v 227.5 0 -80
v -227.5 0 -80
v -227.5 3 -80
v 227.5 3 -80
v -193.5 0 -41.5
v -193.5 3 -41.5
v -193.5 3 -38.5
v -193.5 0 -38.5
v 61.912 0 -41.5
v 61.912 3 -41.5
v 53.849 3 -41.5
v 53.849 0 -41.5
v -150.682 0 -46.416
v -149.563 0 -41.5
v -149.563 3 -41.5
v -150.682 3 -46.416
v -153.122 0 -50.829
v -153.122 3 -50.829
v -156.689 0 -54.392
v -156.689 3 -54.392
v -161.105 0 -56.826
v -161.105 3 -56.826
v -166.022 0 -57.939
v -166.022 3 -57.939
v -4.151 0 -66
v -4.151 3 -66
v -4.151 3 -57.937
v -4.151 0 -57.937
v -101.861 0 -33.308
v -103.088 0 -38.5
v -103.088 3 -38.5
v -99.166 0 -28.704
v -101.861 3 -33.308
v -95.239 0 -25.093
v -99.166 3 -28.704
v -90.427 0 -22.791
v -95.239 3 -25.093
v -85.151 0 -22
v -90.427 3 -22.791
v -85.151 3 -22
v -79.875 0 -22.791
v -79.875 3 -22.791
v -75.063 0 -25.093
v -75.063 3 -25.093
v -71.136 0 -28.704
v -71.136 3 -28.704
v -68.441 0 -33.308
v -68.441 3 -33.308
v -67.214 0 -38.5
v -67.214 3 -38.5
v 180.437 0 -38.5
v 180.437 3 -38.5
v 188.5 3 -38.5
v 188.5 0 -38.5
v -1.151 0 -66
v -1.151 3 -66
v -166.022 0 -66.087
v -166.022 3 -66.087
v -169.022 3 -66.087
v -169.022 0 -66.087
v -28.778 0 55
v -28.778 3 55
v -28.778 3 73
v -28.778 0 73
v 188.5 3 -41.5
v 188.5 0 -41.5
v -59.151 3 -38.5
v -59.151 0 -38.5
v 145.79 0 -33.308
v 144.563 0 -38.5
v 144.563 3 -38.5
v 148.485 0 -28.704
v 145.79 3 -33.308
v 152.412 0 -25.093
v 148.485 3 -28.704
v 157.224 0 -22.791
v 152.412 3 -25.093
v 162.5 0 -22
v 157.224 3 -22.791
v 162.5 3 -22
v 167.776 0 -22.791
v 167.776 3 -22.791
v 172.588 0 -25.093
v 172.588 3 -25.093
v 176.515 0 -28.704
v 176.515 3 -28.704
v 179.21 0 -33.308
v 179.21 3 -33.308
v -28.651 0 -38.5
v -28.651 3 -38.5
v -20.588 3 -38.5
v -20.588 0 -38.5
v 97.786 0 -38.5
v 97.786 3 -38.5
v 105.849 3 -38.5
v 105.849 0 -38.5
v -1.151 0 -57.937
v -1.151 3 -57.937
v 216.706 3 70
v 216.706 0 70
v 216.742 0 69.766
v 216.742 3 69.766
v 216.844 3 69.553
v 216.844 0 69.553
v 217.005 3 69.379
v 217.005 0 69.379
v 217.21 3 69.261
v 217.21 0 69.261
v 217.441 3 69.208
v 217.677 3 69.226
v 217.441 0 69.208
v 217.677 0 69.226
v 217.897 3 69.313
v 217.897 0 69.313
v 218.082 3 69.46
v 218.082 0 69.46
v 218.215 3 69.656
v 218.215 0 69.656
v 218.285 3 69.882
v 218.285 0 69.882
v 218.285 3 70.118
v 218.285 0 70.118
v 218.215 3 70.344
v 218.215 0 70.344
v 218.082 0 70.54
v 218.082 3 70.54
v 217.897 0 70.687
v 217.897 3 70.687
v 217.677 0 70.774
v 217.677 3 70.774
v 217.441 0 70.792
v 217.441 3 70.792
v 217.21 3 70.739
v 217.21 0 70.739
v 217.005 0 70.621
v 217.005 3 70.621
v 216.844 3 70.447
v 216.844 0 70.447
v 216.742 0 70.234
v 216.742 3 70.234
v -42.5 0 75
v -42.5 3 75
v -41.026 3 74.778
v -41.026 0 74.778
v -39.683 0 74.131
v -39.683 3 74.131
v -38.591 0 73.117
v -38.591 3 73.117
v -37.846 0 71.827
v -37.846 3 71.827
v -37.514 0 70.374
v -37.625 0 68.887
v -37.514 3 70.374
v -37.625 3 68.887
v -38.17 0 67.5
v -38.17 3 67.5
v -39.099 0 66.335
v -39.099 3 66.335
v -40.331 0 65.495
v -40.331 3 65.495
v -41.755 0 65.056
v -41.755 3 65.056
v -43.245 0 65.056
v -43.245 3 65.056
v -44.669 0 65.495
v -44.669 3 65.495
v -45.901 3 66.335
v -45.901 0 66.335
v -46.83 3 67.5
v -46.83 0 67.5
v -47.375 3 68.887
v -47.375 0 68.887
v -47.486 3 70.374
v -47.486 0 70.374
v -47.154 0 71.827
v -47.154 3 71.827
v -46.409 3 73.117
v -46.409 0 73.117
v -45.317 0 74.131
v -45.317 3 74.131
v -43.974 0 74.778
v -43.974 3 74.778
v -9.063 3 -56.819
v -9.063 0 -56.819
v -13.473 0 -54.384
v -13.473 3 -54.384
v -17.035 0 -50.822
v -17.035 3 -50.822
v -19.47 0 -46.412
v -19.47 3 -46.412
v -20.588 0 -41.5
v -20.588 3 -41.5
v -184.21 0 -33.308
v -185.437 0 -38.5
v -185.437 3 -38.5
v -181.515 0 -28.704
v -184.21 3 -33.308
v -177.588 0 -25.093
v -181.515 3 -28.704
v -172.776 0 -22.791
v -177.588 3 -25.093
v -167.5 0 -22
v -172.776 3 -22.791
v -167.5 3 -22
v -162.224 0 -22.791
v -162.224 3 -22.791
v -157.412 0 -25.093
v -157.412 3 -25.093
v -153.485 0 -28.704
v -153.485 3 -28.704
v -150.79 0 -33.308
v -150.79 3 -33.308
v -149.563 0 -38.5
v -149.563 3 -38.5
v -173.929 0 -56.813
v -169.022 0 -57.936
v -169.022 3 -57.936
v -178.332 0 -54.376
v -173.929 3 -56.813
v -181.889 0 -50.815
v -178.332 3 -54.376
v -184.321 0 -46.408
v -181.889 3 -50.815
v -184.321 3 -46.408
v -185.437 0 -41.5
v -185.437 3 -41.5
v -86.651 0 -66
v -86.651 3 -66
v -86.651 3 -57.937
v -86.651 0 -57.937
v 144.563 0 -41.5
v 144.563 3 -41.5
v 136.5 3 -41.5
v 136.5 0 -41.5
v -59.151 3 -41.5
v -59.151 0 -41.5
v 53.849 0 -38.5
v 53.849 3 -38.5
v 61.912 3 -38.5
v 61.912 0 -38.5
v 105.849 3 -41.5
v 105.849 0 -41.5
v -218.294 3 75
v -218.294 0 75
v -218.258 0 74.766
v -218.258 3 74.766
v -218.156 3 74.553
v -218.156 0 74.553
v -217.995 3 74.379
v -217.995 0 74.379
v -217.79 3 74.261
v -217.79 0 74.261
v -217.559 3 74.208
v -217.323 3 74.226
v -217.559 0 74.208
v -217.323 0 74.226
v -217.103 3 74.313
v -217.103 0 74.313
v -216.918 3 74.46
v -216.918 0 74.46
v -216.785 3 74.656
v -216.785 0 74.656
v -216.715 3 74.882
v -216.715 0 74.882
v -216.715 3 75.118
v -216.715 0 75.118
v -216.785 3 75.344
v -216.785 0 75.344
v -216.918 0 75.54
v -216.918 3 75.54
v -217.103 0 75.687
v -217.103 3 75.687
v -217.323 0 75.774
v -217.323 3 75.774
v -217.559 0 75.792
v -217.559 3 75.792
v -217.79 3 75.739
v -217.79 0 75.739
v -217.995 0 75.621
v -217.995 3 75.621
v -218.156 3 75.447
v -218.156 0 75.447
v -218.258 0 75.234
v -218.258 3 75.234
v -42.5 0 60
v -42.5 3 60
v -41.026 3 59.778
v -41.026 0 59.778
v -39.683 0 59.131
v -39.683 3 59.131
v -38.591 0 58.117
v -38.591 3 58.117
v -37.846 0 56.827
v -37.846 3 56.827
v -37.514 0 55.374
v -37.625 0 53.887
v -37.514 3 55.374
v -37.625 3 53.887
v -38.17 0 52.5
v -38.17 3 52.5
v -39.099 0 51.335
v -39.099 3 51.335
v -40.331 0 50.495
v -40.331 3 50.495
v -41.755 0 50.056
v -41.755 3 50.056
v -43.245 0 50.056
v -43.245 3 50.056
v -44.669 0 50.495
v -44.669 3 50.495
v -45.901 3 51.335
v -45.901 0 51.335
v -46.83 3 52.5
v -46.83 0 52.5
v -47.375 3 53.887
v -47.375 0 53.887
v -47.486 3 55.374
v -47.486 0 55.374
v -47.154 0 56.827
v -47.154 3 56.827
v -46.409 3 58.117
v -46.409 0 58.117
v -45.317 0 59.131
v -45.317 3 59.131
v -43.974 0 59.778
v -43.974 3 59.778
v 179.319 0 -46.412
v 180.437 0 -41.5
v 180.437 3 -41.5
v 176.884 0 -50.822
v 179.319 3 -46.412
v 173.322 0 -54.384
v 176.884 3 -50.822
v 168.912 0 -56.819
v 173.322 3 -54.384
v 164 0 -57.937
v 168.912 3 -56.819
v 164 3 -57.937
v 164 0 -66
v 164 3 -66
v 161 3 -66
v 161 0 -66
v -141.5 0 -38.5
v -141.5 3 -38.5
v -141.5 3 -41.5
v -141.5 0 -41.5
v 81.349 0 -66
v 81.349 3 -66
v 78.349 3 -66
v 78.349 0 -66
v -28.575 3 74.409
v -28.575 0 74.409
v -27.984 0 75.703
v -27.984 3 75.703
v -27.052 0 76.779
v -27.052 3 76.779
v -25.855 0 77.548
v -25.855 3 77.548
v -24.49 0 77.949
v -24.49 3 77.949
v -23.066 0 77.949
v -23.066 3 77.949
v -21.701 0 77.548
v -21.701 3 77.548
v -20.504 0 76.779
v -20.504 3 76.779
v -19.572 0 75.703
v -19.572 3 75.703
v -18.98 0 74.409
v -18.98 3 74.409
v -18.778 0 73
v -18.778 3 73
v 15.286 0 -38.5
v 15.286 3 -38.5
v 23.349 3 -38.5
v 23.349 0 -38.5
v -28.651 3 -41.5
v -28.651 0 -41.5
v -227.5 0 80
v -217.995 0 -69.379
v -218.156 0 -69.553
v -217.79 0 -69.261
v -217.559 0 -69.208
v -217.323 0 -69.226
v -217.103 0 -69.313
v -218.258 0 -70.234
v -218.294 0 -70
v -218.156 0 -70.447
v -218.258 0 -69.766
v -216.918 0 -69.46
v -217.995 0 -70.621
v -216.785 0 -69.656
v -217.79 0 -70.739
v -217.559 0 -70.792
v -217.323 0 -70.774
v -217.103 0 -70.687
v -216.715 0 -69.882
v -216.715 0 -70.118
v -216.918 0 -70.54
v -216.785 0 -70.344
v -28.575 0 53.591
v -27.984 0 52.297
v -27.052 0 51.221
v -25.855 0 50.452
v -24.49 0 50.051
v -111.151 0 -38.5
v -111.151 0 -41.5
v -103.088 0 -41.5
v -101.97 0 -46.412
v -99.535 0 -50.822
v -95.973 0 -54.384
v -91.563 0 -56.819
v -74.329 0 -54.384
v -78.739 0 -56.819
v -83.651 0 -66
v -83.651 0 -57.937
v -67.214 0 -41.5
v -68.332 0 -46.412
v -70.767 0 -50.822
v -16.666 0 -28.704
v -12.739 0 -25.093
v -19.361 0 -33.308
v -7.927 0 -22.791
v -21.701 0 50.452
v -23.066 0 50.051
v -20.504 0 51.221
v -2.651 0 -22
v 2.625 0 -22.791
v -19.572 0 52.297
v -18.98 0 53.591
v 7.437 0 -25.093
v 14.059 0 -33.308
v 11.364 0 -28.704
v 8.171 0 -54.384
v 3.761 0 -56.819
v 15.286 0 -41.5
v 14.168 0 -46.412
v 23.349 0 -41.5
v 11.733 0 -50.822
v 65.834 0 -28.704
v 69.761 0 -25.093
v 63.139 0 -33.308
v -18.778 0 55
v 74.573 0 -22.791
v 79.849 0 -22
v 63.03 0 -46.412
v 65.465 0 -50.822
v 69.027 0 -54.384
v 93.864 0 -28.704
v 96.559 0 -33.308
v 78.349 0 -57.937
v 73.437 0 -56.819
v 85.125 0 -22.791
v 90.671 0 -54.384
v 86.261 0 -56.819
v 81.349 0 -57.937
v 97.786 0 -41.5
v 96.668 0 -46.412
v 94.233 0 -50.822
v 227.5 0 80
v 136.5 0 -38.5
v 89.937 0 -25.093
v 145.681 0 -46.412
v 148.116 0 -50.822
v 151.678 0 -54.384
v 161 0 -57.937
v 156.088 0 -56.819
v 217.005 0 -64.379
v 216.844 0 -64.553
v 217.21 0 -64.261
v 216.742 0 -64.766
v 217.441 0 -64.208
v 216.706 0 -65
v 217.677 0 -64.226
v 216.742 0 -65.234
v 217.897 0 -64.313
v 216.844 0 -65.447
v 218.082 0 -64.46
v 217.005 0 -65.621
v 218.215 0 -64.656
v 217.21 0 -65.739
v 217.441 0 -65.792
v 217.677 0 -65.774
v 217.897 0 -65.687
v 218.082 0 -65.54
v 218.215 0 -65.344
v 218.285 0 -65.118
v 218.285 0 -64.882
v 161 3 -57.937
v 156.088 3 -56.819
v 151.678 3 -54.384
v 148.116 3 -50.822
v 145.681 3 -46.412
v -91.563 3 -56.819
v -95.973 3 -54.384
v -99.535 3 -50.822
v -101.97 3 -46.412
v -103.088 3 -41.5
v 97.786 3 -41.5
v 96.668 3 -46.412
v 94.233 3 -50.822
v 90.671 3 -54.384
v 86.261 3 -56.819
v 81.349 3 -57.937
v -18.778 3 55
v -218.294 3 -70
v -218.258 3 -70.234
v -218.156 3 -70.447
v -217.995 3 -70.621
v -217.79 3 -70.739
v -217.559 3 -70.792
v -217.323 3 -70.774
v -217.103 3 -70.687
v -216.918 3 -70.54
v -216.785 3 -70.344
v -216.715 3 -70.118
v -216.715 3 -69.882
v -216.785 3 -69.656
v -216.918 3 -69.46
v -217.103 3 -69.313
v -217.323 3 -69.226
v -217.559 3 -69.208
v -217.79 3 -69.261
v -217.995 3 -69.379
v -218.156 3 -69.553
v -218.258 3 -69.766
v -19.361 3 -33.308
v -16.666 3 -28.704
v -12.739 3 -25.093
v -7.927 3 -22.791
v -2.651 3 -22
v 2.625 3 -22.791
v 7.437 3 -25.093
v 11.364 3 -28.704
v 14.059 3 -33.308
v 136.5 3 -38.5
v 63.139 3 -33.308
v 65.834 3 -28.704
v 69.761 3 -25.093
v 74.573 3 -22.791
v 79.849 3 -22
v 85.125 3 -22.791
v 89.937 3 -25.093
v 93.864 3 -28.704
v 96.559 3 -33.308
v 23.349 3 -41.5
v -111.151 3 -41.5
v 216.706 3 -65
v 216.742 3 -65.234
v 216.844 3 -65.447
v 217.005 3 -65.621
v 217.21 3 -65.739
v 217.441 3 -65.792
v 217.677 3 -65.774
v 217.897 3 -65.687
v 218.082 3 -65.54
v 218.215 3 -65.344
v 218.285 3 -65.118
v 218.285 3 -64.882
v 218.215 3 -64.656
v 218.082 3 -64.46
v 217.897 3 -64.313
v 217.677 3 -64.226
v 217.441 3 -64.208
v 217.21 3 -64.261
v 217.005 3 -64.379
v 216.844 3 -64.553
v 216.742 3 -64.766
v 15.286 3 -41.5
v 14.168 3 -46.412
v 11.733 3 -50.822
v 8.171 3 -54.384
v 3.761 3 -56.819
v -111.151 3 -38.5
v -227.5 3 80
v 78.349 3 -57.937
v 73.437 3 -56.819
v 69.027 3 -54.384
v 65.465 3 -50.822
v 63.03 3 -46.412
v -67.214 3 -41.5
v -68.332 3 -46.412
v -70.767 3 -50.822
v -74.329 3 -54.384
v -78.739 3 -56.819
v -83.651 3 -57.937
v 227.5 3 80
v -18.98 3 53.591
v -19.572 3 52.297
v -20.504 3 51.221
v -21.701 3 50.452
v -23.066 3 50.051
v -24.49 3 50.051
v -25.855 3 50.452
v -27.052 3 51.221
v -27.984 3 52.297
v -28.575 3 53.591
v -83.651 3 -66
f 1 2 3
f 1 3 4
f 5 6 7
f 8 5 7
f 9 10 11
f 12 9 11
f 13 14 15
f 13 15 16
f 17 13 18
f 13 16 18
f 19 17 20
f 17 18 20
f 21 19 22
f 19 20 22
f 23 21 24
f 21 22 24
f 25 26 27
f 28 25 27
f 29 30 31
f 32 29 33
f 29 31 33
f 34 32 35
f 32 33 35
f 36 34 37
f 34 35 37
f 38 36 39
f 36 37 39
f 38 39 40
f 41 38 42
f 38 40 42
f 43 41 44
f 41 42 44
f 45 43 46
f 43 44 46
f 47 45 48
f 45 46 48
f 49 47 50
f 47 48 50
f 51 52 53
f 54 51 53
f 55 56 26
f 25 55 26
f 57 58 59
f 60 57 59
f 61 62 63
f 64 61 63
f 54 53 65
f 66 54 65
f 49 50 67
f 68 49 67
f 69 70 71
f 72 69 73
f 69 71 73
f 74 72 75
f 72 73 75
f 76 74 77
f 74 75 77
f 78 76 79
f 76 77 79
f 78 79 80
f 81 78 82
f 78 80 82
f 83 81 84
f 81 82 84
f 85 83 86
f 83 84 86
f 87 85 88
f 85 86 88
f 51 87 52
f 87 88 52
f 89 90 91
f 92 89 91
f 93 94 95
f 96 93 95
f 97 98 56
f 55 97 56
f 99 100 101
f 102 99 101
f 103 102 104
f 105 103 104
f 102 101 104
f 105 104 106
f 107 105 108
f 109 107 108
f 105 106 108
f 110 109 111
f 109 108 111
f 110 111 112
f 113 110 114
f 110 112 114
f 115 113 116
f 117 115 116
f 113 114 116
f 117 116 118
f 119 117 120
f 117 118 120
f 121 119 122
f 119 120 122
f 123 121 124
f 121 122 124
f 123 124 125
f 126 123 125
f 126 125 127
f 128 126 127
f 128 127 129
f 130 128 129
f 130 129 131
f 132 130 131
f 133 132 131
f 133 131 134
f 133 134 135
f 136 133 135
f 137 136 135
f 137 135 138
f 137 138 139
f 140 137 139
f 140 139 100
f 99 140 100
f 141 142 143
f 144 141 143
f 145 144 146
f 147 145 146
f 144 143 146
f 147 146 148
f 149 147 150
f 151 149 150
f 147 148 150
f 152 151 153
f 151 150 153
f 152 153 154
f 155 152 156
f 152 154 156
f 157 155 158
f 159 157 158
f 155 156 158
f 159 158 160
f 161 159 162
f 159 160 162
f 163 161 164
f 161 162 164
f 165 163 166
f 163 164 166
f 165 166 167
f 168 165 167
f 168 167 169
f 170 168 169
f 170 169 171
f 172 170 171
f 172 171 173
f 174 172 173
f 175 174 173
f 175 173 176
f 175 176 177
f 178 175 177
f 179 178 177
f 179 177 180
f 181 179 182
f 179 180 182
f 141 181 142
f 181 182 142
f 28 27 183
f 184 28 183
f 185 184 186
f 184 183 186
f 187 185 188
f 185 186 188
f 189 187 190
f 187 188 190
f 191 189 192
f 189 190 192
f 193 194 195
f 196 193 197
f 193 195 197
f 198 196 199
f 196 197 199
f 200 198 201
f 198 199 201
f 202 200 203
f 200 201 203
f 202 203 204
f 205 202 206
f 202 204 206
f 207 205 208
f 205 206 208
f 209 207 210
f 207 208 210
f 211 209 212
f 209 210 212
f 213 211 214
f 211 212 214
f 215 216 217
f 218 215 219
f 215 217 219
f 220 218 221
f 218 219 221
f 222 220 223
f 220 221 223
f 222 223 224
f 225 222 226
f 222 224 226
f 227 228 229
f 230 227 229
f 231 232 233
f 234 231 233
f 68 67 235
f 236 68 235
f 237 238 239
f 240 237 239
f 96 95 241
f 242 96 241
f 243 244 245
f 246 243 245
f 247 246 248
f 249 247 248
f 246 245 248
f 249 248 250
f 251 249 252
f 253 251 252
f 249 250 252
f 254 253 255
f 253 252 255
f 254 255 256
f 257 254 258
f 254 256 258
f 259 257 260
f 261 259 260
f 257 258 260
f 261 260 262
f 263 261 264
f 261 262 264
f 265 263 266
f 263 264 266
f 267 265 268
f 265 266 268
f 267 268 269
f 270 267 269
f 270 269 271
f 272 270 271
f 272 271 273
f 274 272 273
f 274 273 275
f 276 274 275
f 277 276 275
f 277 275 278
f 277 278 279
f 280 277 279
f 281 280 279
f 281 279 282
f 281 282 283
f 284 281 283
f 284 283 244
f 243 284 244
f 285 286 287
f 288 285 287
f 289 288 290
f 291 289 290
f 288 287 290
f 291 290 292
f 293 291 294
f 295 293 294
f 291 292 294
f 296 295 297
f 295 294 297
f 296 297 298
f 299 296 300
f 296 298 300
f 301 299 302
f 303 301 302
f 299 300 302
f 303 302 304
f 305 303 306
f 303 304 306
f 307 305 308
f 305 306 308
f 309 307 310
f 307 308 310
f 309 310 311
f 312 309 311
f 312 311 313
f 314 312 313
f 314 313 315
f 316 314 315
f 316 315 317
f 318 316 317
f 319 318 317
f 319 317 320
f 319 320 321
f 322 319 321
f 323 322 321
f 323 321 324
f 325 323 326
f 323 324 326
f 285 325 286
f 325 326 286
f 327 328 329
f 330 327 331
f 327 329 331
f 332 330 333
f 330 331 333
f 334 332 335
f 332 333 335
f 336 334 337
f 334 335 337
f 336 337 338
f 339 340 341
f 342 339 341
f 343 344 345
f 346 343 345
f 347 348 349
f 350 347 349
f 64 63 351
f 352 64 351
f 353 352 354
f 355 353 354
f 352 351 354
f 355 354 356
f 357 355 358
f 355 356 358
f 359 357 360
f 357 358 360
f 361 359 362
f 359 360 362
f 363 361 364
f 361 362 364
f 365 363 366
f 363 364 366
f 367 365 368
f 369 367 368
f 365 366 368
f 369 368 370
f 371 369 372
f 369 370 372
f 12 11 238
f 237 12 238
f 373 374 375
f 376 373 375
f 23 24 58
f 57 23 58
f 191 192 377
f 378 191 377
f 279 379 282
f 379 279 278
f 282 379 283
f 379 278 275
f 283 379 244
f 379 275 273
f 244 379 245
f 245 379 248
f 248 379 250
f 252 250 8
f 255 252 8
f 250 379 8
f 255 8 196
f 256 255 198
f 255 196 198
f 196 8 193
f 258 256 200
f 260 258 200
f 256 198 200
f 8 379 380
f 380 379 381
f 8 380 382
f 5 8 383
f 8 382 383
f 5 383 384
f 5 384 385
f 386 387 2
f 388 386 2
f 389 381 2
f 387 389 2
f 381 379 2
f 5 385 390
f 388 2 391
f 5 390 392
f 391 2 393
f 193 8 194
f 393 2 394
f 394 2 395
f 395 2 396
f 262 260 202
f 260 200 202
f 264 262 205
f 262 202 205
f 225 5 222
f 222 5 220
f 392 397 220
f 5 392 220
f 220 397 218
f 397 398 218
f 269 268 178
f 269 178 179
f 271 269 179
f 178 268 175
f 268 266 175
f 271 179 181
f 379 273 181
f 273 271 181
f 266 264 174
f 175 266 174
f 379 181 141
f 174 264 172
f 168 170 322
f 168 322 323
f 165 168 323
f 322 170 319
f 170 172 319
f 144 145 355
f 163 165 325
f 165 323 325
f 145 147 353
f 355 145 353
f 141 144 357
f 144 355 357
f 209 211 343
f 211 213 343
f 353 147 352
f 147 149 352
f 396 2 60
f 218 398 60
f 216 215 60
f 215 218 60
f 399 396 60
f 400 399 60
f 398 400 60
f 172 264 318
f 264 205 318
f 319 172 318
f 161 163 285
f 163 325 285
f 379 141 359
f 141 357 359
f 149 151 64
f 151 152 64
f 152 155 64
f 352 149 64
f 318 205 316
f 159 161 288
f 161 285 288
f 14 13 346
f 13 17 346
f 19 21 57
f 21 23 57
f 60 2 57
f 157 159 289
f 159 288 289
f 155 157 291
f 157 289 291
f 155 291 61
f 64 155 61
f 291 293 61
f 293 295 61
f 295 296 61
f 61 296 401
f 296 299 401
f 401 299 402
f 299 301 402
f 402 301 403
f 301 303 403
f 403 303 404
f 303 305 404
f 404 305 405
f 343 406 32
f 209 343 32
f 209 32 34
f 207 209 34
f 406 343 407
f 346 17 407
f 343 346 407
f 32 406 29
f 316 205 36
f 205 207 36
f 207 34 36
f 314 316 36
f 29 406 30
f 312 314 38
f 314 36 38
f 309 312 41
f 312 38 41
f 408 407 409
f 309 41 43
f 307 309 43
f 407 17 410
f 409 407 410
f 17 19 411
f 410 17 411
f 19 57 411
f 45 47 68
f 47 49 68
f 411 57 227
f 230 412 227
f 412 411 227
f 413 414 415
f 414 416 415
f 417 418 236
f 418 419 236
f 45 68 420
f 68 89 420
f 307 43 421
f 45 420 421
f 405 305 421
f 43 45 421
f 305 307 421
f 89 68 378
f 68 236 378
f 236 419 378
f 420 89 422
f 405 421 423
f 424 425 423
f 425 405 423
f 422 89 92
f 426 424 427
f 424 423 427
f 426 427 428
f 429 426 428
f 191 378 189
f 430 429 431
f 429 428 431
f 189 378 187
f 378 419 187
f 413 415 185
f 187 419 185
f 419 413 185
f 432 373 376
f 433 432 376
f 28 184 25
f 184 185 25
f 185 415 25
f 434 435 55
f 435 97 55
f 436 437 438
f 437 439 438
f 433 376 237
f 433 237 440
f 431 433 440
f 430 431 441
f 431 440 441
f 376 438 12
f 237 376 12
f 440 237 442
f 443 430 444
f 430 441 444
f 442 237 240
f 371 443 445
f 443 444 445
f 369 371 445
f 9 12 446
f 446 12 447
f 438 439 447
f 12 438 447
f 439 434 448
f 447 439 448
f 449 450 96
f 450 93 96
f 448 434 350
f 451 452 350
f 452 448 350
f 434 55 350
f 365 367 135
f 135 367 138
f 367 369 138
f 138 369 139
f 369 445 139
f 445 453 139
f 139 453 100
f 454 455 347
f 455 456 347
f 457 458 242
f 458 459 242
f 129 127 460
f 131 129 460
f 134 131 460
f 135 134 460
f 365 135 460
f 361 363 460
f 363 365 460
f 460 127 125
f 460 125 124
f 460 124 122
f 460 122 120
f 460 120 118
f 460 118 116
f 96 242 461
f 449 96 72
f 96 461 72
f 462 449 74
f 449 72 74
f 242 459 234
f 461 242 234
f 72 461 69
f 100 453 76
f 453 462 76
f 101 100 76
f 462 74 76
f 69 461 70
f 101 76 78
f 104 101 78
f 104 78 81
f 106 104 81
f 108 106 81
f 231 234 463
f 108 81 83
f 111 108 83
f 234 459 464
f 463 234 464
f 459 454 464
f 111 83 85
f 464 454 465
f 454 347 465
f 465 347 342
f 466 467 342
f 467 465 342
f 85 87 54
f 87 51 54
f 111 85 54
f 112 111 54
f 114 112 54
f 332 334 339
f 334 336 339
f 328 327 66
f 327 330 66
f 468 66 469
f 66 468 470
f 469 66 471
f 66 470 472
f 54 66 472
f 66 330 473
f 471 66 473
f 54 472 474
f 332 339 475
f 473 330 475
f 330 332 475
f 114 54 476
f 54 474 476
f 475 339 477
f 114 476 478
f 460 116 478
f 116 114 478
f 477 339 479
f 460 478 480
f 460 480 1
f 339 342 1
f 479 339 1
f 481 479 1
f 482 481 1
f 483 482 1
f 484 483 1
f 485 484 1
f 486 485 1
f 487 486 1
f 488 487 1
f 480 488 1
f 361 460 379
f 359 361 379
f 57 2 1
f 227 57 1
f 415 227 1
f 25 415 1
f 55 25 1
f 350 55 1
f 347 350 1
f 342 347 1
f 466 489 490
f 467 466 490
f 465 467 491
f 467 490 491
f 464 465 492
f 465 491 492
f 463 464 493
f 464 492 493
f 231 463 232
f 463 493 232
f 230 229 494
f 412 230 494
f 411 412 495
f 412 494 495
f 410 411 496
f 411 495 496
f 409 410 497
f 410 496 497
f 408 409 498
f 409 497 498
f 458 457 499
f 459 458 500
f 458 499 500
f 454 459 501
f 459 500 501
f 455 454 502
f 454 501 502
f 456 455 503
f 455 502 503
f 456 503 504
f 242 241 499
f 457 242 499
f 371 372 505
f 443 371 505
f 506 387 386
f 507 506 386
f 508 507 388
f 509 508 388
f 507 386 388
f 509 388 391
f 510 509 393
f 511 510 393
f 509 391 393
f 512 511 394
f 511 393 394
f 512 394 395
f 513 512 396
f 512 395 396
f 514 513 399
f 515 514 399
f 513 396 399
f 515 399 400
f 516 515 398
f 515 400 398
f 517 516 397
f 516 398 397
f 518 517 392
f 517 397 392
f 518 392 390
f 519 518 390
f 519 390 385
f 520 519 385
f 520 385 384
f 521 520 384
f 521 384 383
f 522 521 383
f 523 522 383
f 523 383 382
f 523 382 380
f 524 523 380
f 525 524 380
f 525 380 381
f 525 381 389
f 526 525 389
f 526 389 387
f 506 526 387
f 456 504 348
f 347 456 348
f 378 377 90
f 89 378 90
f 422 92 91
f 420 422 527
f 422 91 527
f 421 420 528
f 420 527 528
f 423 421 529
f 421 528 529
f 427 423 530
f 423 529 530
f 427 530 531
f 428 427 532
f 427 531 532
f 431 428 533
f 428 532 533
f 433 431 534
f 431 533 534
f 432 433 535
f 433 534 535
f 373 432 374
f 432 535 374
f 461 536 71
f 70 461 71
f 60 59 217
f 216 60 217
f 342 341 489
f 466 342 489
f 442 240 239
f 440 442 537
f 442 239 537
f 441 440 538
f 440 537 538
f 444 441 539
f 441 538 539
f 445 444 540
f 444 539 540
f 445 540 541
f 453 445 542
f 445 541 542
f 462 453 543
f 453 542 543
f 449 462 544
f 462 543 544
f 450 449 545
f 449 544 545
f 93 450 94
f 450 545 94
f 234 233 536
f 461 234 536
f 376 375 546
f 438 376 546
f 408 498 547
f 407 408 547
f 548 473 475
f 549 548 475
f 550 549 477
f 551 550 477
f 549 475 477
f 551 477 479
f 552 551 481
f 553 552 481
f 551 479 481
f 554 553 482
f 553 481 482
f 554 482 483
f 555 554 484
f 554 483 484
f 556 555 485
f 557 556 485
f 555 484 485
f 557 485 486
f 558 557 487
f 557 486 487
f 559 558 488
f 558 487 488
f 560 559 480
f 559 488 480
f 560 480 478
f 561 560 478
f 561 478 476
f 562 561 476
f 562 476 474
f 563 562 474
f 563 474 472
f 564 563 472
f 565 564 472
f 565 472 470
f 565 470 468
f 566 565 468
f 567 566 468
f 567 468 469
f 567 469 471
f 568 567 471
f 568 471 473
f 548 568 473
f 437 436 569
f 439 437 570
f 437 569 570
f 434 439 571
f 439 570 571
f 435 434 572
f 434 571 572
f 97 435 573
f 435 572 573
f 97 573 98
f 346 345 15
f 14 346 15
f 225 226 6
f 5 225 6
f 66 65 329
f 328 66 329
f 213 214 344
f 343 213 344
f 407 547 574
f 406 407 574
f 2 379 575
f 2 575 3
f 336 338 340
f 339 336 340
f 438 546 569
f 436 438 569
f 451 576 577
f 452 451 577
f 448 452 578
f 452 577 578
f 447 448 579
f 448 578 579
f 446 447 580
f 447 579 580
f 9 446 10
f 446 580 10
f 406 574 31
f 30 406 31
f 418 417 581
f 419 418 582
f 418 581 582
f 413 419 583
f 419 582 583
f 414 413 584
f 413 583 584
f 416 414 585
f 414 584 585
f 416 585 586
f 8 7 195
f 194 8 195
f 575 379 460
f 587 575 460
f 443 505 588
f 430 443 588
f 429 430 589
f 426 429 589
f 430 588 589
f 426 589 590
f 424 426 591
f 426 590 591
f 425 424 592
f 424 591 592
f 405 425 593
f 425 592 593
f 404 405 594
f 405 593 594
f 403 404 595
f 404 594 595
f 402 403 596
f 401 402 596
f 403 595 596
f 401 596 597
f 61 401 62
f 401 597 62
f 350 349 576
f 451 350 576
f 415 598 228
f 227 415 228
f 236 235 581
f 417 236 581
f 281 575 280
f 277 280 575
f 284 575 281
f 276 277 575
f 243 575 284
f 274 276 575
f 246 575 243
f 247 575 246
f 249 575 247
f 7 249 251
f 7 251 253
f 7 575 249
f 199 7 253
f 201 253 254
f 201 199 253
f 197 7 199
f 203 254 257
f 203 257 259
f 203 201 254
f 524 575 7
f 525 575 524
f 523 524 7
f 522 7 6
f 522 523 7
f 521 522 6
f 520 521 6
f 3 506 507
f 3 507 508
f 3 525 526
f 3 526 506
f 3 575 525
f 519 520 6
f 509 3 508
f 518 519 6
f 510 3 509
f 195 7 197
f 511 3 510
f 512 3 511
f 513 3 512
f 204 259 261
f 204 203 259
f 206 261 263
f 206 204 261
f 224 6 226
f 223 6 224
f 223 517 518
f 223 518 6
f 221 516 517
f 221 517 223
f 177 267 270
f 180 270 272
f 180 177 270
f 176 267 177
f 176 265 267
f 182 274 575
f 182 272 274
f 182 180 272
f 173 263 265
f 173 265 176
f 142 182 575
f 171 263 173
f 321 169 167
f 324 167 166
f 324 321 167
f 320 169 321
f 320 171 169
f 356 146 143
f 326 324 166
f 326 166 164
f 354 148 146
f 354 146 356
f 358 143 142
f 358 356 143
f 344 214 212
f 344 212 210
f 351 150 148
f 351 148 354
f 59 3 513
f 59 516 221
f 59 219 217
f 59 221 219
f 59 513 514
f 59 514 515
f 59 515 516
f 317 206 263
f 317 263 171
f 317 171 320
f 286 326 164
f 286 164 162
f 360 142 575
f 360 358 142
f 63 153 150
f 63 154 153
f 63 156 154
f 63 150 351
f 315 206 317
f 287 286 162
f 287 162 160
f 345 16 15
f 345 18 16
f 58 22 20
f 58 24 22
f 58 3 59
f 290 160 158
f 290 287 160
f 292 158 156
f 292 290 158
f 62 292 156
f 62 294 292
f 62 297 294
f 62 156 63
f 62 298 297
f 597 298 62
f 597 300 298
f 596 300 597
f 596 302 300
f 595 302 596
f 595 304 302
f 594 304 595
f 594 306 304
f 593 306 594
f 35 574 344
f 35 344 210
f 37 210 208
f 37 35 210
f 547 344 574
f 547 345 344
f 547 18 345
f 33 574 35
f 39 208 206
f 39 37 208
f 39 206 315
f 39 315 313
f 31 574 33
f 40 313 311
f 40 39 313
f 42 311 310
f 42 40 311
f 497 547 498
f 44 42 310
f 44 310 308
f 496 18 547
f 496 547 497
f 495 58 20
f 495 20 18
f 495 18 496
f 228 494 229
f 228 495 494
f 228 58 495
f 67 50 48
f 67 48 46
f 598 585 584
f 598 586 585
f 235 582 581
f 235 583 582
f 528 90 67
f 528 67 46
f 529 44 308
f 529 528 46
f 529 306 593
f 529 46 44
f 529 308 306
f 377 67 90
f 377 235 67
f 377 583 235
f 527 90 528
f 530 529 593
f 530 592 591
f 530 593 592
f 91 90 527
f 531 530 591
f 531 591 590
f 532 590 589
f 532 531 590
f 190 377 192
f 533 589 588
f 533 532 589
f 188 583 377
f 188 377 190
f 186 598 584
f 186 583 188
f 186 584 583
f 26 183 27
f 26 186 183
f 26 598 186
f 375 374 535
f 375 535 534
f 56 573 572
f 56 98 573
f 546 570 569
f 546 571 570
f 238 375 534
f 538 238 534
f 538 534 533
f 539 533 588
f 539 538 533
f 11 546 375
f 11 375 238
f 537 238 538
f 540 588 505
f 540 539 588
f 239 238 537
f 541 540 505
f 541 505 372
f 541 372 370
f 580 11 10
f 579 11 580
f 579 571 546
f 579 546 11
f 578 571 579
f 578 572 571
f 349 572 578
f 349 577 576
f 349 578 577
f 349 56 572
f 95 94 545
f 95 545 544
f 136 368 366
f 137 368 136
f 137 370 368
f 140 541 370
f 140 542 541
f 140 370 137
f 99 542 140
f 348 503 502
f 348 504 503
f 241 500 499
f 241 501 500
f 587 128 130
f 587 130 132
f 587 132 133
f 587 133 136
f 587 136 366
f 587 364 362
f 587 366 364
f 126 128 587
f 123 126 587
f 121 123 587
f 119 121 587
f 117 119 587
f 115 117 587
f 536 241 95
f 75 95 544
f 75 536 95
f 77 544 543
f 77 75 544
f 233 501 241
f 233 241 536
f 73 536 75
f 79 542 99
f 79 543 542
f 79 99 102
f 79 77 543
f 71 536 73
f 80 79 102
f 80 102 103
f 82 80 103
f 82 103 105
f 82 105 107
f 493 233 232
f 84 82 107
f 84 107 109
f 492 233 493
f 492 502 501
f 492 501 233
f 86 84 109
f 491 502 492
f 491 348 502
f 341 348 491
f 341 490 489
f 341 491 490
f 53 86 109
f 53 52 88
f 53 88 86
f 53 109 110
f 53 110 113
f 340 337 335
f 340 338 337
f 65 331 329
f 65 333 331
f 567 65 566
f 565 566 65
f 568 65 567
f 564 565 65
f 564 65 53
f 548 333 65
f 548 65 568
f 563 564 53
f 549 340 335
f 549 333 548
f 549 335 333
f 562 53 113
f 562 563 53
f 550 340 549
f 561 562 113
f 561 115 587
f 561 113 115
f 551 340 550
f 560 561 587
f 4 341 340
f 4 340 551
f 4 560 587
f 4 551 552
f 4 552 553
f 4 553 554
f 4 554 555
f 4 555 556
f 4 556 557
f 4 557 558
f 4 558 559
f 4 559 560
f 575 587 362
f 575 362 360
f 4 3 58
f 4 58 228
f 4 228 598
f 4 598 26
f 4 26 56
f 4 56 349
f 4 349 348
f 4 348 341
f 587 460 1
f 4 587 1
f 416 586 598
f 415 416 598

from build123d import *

# Parameters (mm, degrees)
SKETCH1_W                      = 455
SKETCH1_H                      = 160
BOSS_EXTRUDE1_DEPTH            = 3
SKETCH2_R                      = 18
SKETCH2_R_2                    = 5
CUT_EXTRUDE1_DEPTH             = 3
F_1_16_0_0625_DIAMETER_HOLE2_D = 1.5875
CUT_EXTRUDE2_DEPTH             = 10
SKETCH7_4_W                    = 3
SKETCH7_4_H                    = 26
CUT_EXTRUDE3_DEPTH             = 10


with BuildPart() as part:
    # Sketch1 → Boss-Extrude1 (new body)
    with BuildSketch(Plane(origin=(0, 0, 0), x_dir=(1, 0, 0), z_dir=(0, 1, 0))):
        Rectangle(SKETCH1_W, SKETCH1_H)
    extrude(amount=BOSS_EXTRUDE1_DEPTH)

    # Sketch2 → Cut-Extrude1 (cut)
    with BuildSketch(Plane(origin=(0, 3, 0), x_dir=(1, 0, 0), z_dir=(0, 1, 0))):
        with Locations((-167.5, 40)):
            Circle(SKETCH2_R)
        with Locations((-85.151099534, 40)):
            Circle(SKETCH2_R)
        with Locations((-2.651099534, 40)):
            Circle(SKETCH2_R)
        with Locations((79.848900466, 39.999983289)):
            Circle(SKETCH2_R)
        with Locations((162.5, 40)):
            Circle(SKETCH2_R)
        with Locations((-42.5, -55)):
            Circle(SKETCH2_R_2)
        with Locations((-42.5, -70)):
            Circle(SKETCH2_R_2)
        with BuildLine():
            Line((-28.777964672, -55), (-28.777964672, -73))
            ThreePointArc((-28.777964672, -73), (-23.777964672, -78), (-18.777964672, -73))
            Line((-18.777964672, -73), (-18.777964672, -55))
            ThreePointArc((-18.777964672, -55), (-23.777964672, -50), (-28.777964672, -55))
        make_face()
    extrude(amount=-CUT_EXTRUDE1_DEPTH, mode=Mode.SUBTRACT)

    # 1/16 (0.0625) Diameter Hole2 (through all)
    with Locations(Plane(origin=(0, 3, 0), x_dir=(1, 0, 0), z_dir=(0, 1, 0))):
        with Locations((-217.5, -75), (-217.5, 70), (217.5, -70), (217.5, 65)):
            Hole(F_1_16_0_0625_DIAMETER_HOLE2_D / 2)

    # Sketch7 → Cut-Extrude2 (cut)
    with BuildSketch(Plane(origin=(0, 3, 0), x_dir=(1, 0, 0), z_dir=(0, 1, 0))):
        with BuildLine():
            Line((-149.562608885, 38.5), (-141.5, 38.5))
            Line((-141.5, 38.5), (-141.5, 41.5))
            Line((-141.5, 41.5), (-149.562608885, 41.5))
            ThreePointArc((-149.562608885, 41.5), (-149.5, 40), (-149.562608885, 38.5))
        make_face()
        with BuildLine():
            Line((-193.5, 38.5), (-185.437391115, 38.5))
            ThreePointArc((-185.437391115, 38.5), (-185.5, 40), (-185.437391115, 41.5))
            Line((-185.437391115, 41.5), (-193.5, 41.5))
            Line((-193.5, 41.5), (-193.5, 38.5))
        make_face()
        with BuildLine():
            ThreePointArc((-169.022220782, 57.935519058), (-167.522298342, 57.999986188), (-166.022220782, 57.939235451))
            Line((-166.022220782, 57.939235451), (-166.022220782, 66.086538462))
            Line((-166.022220782, 66.086538462), (-169.022220782, 66.086538462))
            Line((-169.022220782, 66.086538462), (-169.022220782, 57.935519058))
        make_face()
    extrude(amount=-CUT_EXTRUDE2_DEPTH, mode=Mode.SUBTRACT)

    # Sketch7<4> → Cut-Extrude3 (cut)
    with BuildSketch(Plane(origin=(0, 3, 0), x_dir=(1, 0, 0), z_dir=(0, 1, 0))):
        with BuildLine():
            Line((-111.151099534, 38.5), (-103.088490649, 38.5))
            ThreePointArc((-103.088490649, 38.5), (-103.151099534, 40), (-103.088490649, 41.5))
            Line((-103.088490649, 41.5), (-111.151099534, 41.5))
            Line((-111.151099534, 41.5), (-111.151099534, 38.5))
        make_face()
        with BuildLine():
            ThreePointArc((-67.21370842, 41.5), (-67.151099534, 40), (-67.21370842, 38.5))
            Line((-67.21370842, 38.5), (-59.151099534, 38.5))
            Line((-59.151099534, 38.5), (-59.151099534, 41.5))
            Line((-59.151099534, 41.5), (-67.21370842, 41.5))
        make_face()
        with Locations((-85.151099534, 53)):
            Rectangle(SKETCH7_4_W, SKETCH7_4_H)
        with BuildLine():
            Line((97.78629158, 38.499983289), (105.848900466, 38.499983289))
            Line((105.848900466, 38.499983289), (105.848900466, 41.499983289))
            Line((105.848900466, 41.499983289), (97.78629158, 41.499983289))
            ThreePointArc((97.78629158, 41.499983289), (97.848900466, 39.999983289), (97.78629158, 38.499983289))
        make_face()
        with BuildLine():
            Line((53.848900466, 38.499983289), (61.911509351, 38.499983289))
            ThreePointArc((61.911509351, 38.499983289), (61.848900466, 39.999983289), (61.911509351, 41.499983289))
            Line((61.911509351, 41.499983289), (53.848900466, 41.499983289))
            Line((53.848900466, 41.499983289), (53.848900466, 38.499983289))
        make_face()
        with BuildLine():
            ThreePointArc((78.348900466, 57.937374404), (79.848900466, 57.999983289), (81.348900466, 57.937374404))
            Line((81.348900466, 57.937374404), (81.348900466, 65.999983289))
            Line((81.348900466, 65.999983289), (78.348900466, 65.999983289))
            Line((78.348900466, 65.999983289), (78.348900466, 57.937374404))
        make_face()
        with BuildLine():
            Line((180.437391115, 38.5), (188.5, 38.5))
            Line((188.5, 38.5), (188.5, 41.5))
            Line((188.5, 41.5), (180.437391115, 41.5))
            ThreePointArc((180.437391115, 41.5), (180.5, 40), (180.437391115, 38.5))
        make_face()
        with BuildLine():
            Line((136.5, 38.5), (144.562608885, 38.5))
            ThreePointArc((144.562608885, 38.5), (144.5, 40), (144.562608885, 41.5))
            Line((144.562608885, 41.5), (136.5, 41.5))
            Line((136.5, 41.5), (136.5, 38.5))
        make_face()
        with BuildLine():
            ThreePointArc((161, 57.937391115), (162.5, 58), (164, 57.937391115))
            Line((164, 57.937391115), (164, 66))
            Line((164, 66), (161, 66))
            Line((161, 66), (161, 57.937391115))
        make_face()
        with BuildLine():
            Line((15.28629158, 38.5), (23.348900466, 38.5))
            Line((23.348900466, 38.5), (23.348900466, 41.5))
            Line((23.348900466, 41.5), (15.28629158, 41.5))
            ThreePointArc((15.28629158, 41.5), (15.348900466, 40), (15.28629158, 38.5))
        make_face()
        with BuildLine():
            Line((-28.651099534, 38.5), (-20.588490649, 38.5))
            ThreePointArc((-20.588490649, 38.5), (-20.651099534, 40), (-20.588490649, 41.5))
            Line((-20.588490649, 41.5), (-28.651099534, 41.5))
            Line((-28.651099534, 41.5), (-28.651099534, 38.5))
        make_face()
        with BuildLine():
            ThreePointArc((-4.151099534, 57.937391115), (-2.651099534, 58), (-1.151099534, 57.937391115))
            Line((-1.151099534, 57.937391115), (-1.151099534, 66))
            Line((-1.151099534, 66), (-4.151099534, 66))
            Line((-4.151099534, 66), (-4.151099534, 57.937391115))
        make_face()
    extrude(amount=-CUT_EXTRUDE3_DEPTH, mode=Mode.SUBTRACT)


solid = part.part
